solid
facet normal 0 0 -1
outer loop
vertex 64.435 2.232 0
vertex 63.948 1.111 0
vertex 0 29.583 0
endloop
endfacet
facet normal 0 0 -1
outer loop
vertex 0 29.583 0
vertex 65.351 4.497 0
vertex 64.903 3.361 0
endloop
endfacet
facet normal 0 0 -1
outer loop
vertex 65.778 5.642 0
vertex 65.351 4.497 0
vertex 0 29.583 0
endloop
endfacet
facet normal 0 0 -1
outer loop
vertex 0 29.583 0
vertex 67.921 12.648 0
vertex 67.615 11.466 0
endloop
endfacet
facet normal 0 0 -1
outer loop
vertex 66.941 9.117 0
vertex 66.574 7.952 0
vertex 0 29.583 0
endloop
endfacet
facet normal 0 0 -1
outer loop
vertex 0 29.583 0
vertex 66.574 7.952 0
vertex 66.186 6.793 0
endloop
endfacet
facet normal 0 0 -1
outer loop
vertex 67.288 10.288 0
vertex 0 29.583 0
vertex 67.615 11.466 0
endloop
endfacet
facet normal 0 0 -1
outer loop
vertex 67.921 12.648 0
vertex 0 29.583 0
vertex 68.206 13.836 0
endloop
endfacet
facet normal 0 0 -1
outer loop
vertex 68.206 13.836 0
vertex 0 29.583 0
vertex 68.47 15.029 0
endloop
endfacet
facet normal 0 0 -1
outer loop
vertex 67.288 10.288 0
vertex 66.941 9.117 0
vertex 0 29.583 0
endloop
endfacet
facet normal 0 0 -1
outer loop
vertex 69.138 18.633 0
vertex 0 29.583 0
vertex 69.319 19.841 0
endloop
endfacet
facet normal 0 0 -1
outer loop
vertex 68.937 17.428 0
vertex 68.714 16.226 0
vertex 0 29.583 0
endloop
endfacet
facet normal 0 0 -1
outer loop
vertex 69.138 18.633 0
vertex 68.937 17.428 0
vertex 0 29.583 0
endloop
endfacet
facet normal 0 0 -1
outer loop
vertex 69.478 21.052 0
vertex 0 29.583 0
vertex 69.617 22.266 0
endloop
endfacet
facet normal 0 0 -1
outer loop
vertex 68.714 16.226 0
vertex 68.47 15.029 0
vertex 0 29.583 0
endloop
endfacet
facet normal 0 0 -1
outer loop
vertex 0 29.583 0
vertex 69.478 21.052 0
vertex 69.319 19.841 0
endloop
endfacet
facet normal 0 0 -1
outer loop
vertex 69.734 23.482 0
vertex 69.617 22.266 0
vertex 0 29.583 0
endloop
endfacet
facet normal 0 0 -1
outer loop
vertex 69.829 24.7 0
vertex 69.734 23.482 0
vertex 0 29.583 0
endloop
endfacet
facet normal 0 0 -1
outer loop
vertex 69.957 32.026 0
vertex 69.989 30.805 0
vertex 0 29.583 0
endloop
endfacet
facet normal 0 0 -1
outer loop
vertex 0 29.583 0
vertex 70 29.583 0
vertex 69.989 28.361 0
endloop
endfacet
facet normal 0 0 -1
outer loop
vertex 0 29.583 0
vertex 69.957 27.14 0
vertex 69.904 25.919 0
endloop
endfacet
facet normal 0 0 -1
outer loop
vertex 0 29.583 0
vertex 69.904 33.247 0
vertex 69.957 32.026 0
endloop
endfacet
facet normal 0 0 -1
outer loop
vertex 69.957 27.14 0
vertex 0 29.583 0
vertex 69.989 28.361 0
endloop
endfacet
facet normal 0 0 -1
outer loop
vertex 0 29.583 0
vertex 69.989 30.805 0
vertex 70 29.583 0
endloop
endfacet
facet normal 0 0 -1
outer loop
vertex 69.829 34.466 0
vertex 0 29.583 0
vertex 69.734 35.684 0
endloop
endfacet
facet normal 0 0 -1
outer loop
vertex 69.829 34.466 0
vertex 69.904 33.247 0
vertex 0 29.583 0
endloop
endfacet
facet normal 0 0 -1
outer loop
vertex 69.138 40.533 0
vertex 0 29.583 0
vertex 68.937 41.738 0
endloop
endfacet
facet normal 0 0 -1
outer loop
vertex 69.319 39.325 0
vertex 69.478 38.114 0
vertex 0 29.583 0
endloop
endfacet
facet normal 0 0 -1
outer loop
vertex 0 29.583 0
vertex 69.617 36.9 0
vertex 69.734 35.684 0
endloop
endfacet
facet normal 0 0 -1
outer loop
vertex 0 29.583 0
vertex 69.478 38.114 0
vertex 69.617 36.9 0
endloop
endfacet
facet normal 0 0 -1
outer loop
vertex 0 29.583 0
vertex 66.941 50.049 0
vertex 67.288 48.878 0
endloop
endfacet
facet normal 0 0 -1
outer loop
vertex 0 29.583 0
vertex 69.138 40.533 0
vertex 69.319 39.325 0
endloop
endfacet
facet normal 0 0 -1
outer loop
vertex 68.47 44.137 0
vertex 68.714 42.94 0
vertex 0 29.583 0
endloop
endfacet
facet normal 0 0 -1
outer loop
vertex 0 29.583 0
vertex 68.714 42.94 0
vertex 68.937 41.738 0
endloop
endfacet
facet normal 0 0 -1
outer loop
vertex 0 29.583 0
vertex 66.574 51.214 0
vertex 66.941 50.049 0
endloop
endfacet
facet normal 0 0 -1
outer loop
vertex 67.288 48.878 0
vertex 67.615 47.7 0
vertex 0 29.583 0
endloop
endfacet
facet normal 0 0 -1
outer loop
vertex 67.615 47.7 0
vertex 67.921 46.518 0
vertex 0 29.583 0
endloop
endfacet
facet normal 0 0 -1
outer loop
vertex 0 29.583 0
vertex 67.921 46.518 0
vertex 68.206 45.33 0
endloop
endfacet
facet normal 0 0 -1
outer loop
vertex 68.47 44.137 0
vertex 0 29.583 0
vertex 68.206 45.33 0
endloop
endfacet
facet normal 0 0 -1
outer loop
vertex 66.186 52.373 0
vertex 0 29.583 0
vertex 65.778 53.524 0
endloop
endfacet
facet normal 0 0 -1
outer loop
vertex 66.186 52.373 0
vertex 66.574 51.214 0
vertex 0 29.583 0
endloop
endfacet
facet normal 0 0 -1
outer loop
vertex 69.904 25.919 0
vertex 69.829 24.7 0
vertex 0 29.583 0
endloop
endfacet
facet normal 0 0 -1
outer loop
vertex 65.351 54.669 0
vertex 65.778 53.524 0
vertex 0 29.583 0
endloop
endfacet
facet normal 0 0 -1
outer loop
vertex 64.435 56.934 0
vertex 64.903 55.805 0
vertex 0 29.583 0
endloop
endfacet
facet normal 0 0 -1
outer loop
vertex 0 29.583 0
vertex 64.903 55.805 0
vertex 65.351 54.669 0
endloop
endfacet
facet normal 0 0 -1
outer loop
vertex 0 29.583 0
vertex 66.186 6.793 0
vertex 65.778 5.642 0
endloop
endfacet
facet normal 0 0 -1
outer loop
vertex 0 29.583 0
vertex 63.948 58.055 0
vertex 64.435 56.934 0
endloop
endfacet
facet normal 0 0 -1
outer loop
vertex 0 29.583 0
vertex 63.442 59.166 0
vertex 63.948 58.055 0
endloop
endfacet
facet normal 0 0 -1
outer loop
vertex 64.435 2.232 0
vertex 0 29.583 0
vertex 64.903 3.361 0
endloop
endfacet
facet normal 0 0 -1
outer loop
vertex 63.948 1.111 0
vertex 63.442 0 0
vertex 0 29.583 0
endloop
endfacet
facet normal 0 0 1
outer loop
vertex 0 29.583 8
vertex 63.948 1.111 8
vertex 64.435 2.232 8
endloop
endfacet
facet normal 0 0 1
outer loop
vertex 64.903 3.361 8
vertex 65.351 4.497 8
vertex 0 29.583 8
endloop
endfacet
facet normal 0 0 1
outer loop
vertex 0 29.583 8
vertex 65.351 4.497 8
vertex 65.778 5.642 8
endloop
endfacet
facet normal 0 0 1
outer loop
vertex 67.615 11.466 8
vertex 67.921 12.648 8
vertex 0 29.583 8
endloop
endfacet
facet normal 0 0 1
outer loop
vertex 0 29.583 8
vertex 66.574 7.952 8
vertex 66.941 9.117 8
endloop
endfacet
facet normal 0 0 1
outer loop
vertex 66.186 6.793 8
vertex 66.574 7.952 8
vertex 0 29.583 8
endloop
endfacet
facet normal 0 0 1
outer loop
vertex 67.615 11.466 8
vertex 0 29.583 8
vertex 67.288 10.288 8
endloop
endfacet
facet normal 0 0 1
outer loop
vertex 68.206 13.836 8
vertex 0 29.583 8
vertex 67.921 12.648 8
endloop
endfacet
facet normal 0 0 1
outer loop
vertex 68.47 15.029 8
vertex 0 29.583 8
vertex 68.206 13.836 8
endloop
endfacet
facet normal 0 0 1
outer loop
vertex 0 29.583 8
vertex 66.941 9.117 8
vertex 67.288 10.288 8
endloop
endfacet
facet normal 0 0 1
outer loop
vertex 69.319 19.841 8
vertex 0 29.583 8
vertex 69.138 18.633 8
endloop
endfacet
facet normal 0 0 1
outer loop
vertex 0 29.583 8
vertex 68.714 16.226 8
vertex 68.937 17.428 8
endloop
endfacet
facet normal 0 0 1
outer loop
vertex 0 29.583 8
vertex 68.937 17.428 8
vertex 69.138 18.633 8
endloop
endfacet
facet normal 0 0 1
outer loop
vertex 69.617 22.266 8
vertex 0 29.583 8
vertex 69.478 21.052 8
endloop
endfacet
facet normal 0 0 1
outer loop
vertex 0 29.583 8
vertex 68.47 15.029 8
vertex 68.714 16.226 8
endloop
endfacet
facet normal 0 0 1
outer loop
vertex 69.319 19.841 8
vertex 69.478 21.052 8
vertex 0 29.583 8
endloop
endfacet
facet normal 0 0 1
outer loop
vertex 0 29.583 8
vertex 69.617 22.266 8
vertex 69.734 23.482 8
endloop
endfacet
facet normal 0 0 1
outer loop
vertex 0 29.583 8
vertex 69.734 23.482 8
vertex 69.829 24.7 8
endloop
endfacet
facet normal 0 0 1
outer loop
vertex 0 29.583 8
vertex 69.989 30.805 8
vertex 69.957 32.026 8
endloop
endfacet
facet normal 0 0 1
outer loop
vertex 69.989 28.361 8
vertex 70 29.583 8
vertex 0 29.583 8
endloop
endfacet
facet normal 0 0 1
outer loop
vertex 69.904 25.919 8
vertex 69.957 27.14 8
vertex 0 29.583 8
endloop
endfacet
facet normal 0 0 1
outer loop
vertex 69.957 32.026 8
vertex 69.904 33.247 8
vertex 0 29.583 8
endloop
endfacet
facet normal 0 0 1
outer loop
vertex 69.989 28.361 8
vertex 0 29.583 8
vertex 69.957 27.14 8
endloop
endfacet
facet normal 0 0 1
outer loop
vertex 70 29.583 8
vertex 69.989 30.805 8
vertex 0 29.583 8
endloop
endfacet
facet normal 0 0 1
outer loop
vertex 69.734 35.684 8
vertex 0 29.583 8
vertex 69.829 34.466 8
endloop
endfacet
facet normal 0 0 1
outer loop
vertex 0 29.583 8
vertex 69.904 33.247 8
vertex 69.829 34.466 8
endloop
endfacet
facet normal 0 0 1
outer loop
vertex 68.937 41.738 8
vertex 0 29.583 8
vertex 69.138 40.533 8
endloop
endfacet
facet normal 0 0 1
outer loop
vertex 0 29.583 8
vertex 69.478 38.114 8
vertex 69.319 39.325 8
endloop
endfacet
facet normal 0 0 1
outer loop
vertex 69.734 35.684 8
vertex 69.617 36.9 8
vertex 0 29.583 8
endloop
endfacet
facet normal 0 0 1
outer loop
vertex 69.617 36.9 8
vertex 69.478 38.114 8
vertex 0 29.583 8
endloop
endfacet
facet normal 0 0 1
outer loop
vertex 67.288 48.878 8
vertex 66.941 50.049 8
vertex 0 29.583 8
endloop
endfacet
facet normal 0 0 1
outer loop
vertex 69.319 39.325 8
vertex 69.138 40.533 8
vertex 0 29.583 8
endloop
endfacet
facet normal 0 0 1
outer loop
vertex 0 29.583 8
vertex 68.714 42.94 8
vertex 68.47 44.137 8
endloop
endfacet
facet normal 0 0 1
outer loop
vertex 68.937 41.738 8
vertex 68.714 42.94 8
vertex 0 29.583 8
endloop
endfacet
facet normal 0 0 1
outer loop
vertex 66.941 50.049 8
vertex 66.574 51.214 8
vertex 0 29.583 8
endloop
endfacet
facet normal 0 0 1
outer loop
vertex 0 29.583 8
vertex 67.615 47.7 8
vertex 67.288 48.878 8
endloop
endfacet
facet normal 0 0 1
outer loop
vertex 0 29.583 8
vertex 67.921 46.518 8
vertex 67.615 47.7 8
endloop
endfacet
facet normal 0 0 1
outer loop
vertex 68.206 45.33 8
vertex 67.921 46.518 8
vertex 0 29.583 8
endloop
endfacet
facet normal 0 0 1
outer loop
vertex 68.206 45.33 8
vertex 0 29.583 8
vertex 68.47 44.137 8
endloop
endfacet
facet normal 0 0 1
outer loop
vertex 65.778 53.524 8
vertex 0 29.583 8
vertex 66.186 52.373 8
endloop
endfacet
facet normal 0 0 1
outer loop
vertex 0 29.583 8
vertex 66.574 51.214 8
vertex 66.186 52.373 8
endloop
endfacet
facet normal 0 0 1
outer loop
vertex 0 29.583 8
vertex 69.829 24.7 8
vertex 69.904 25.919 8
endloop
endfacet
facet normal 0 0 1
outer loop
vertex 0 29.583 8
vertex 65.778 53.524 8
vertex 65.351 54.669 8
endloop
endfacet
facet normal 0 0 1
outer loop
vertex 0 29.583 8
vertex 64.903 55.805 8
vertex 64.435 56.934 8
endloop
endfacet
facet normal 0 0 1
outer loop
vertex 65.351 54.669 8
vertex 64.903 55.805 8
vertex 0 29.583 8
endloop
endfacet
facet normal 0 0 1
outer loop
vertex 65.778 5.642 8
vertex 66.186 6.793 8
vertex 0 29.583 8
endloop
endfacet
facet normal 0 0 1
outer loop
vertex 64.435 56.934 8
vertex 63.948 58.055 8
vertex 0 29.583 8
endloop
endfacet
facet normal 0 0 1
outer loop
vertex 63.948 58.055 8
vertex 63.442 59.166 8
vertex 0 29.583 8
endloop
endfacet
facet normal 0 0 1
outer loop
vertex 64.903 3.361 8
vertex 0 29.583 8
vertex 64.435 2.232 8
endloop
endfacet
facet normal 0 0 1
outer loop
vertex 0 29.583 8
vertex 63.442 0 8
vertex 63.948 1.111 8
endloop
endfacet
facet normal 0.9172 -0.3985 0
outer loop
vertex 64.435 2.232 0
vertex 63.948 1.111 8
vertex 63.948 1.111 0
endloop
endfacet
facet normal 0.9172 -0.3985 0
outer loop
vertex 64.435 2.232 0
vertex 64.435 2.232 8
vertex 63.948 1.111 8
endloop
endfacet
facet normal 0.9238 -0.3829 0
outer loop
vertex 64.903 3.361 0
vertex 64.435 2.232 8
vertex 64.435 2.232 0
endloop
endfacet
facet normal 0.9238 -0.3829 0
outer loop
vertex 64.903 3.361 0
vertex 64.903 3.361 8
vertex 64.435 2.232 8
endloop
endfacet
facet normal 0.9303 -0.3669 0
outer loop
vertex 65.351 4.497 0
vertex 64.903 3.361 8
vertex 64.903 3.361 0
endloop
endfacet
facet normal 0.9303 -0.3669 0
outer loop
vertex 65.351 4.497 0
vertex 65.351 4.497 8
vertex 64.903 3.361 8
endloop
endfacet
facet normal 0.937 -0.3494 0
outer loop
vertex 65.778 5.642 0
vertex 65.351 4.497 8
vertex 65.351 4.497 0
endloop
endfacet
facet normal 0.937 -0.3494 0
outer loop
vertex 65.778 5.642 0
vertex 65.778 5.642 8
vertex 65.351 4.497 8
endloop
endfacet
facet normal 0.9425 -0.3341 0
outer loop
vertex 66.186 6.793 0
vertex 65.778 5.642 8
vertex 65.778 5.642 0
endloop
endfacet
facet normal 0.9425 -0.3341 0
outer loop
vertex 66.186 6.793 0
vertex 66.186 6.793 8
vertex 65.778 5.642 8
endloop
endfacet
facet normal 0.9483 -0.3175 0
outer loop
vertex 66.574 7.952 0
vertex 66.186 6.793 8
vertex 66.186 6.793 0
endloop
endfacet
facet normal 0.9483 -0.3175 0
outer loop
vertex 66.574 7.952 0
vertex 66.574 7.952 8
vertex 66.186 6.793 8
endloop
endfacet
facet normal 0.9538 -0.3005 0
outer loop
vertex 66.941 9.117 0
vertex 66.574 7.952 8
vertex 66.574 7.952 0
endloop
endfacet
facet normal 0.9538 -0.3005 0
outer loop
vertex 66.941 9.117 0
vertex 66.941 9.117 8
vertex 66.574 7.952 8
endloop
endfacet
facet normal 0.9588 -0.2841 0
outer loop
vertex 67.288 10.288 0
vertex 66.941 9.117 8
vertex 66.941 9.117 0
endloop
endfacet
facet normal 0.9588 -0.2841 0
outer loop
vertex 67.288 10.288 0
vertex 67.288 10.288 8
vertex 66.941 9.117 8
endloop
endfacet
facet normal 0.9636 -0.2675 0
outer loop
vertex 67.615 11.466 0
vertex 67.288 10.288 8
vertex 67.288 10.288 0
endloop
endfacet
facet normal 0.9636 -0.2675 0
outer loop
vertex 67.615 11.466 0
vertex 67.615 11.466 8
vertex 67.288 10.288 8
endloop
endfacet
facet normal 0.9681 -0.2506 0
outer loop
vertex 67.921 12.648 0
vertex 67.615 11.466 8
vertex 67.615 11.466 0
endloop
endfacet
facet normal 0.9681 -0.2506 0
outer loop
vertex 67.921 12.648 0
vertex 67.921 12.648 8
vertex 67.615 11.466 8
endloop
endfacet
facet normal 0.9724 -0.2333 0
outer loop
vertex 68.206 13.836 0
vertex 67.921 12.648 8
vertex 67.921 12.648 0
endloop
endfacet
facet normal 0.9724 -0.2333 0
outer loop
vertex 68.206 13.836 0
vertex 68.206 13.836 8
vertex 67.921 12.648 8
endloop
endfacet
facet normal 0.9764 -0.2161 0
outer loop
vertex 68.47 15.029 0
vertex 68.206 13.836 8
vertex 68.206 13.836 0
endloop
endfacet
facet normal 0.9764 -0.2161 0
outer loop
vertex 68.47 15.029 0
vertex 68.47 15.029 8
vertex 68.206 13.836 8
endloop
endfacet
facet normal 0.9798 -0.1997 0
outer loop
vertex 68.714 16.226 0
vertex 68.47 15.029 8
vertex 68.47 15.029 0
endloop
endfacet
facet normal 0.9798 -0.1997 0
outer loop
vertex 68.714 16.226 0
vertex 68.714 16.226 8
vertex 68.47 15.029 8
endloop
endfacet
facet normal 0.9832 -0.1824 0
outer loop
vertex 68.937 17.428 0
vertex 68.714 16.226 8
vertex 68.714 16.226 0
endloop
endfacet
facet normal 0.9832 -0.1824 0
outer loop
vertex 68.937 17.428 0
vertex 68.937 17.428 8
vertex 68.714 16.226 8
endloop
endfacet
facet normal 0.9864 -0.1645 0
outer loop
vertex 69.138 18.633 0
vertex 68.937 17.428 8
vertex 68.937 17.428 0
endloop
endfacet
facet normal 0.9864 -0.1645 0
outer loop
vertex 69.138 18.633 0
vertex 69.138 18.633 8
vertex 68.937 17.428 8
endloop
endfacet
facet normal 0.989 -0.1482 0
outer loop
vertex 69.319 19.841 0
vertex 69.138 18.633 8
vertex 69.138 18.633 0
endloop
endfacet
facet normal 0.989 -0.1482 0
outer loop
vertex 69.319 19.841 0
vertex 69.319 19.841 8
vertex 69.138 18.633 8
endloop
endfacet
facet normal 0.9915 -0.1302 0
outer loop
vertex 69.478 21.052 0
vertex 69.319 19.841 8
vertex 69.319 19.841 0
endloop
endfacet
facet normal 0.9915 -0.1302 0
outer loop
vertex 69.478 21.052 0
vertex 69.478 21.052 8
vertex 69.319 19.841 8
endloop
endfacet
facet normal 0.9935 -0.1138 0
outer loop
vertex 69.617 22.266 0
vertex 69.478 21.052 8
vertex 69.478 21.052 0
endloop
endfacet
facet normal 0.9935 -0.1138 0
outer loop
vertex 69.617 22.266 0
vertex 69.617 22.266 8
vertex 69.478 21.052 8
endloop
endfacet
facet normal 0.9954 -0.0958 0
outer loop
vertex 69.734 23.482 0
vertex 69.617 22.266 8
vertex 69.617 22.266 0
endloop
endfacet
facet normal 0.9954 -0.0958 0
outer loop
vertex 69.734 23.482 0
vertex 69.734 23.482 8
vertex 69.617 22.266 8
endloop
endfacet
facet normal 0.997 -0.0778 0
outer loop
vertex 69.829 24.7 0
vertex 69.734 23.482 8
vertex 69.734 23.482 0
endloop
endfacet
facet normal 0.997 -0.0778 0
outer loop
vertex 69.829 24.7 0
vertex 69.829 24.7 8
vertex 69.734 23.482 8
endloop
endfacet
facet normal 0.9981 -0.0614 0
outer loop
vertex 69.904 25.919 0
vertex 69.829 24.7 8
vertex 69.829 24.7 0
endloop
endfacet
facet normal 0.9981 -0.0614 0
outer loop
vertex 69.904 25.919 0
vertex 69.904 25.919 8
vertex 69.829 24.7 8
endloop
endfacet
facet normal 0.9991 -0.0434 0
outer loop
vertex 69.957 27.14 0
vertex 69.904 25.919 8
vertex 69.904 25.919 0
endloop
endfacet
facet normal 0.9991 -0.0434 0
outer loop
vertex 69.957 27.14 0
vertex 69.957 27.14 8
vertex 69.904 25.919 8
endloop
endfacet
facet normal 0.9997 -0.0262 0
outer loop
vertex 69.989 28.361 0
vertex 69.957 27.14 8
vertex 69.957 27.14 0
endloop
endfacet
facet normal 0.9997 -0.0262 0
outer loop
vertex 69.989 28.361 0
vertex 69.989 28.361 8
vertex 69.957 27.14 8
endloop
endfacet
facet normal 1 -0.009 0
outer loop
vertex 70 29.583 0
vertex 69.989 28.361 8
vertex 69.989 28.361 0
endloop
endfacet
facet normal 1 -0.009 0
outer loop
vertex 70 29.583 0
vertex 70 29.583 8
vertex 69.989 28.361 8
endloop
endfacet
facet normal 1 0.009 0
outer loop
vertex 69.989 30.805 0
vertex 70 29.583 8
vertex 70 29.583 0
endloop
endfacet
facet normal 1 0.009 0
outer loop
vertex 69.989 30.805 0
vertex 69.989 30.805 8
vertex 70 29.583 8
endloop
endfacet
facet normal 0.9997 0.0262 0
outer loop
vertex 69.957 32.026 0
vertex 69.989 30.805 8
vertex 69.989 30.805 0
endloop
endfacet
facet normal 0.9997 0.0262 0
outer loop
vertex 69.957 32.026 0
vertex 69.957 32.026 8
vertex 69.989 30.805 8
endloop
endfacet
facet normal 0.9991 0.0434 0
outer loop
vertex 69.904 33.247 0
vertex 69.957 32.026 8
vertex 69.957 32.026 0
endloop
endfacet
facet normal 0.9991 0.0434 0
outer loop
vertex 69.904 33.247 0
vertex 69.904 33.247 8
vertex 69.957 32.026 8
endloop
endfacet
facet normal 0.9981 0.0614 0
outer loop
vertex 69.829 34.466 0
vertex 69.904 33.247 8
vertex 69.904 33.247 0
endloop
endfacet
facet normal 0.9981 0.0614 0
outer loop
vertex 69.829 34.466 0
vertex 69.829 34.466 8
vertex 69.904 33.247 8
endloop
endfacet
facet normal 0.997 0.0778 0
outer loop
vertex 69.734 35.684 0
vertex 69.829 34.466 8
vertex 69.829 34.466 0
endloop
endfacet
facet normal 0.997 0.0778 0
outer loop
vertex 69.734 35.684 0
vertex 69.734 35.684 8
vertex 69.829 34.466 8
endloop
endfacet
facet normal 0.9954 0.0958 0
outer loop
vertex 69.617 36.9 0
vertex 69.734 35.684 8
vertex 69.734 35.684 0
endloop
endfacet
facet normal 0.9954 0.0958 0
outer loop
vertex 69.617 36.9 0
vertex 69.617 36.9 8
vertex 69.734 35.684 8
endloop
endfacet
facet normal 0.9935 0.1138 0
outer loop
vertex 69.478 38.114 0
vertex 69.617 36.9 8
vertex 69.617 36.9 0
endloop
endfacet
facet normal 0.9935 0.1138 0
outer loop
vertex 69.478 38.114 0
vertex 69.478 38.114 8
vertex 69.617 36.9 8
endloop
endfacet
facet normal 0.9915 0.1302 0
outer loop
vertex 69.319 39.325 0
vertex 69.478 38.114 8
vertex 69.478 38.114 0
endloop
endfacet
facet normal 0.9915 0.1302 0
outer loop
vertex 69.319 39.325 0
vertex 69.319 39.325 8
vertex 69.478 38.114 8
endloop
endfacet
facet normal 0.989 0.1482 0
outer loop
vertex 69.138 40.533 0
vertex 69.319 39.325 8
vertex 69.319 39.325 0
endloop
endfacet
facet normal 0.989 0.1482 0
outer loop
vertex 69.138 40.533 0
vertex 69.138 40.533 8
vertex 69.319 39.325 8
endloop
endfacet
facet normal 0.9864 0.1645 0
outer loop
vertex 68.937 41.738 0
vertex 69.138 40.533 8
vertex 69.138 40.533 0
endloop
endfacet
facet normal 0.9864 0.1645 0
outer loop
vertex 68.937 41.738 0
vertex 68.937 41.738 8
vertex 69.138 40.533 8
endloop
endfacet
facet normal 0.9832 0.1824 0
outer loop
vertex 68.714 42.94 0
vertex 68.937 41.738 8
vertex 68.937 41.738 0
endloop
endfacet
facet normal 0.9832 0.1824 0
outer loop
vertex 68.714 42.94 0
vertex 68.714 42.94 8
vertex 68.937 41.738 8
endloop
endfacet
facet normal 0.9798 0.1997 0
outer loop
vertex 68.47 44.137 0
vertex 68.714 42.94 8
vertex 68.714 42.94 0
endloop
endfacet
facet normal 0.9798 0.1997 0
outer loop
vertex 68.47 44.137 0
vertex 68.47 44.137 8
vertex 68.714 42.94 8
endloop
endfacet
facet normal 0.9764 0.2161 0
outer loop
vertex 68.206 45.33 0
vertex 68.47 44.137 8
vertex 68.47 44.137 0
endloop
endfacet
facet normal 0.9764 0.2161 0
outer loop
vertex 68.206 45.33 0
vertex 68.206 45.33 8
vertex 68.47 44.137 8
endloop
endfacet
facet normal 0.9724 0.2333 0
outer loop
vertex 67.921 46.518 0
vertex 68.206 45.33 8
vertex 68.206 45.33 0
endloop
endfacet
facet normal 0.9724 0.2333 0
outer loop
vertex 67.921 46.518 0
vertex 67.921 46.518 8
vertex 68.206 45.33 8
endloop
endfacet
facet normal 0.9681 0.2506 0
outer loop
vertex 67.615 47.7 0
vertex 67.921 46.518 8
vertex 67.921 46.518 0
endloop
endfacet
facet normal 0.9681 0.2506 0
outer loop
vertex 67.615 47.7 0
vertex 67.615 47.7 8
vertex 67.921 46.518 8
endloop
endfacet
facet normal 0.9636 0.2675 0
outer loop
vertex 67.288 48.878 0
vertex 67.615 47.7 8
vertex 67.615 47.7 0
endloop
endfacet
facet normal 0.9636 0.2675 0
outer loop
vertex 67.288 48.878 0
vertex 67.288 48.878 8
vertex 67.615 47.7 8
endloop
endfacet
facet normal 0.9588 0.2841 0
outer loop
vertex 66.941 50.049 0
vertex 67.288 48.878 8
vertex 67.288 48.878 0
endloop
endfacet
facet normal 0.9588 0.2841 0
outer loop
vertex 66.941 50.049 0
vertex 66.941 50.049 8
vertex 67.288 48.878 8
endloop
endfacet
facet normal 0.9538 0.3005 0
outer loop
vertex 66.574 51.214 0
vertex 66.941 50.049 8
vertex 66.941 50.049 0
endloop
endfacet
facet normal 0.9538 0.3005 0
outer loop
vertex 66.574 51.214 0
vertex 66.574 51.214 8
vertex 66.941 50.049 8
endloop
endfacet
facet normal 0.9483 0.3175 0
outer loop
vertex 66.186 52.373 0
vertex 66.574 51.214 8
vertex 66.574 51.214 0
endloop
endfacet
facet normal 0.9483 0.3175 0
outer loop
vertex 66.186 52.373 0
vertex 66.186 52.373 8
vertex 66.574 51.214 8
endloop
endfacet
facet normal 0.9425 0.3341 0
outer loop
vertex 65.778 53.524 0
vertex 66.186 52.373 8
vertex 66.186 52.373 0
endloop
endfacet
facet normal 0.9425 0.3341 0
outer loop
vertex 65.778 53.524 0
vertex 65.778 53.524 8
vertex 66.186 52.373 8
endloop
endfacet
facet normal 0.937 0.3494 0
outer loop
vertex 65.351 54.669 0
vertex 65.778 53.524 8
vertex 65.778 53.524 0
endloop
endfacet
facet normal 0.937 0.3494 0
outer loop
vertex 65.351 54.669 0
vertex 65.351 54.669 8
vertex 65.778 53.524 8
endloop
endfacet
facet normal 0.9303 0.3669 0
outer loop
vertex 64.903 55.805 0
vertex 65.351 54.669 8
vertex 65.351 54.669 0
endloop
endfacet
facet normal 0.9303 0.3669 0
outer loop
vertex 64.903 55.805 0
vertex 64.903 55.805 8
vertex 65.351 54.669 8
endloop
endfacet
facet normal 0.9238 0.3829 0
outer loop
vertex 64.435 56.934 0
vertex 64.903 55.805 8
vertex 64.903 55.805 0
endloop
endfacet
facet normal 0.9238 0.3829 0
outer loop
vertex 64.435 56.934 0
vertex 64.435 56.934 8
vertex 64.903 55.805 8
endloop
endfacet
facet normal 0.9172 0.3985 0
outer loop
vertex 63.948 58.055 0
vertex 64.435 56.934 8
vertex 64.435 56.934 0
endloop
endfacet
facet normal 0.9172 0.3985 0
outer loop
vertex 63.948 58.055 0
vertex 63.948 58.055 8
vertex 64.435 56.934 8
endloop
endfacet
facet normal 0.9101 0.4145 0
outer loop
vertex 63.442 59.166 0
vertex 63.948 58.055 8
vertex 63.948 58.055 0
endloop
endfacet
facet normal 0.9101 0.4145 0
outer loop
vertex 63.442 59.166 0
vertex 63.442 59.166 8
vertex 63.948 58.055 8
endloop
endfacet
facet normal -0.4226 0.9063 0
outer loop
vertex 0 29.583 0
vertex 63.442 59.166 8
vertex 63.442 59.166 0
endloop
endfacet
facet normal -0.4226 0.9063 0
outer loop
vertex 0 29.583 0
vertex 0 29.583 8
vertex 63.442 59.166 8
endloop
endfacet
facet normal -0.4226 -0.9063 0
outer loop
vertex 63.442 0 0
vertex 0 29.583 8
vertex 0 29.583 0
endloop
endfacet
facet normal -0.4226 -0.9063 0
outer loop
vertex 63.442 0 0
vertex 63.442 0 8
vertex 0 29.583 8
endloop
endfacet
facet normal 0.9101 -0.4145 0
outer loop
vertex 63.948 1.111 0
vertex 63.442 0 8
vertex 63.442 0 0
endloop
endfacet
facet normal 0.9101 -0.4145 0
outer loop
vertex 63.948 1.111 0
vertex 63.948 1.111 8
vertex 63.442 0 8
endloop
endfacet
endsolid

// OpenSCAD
$fn = 32;

// ----------------------------------------------------------------------
// Arc profile plate: sector, 52 points
// ----------------------------------------------------------------------

// --- parameters (mm) ---
sector_angle = 50;        // sector angle, degrees
sector_r = 70;            // outer radius
arc_step = 1;             // sampling step of the arc, degrees
plate_t = 8;              // plate thickness, Z

bbox_x = 2 * sector_r * sin(sector_angle / 2);  // chord of the sector
bbox_y = sector_r;  // depth of the sector (apex to arc)

profile = [[63.442, 0], [63.948, 1.111], [64.435, 2.232], [64.903, 3.361], [65.351, 4.497], [65.778, 5.642], [66.186, 6.793], [66.574, 7.952], [66.941, 9.117], [67.288, 10.288], [67.615, 11.466], [67.921, 12.648], [68.206, 13.836], [68.47, 15.029], [68.714, 16.226], [68.937, 17.428], [69.138, 18.633], [69.319, 19.841], [69.478, 21.052], [69.617, 22.266], [69.734, 23.482], [69.829, 24.7], [69.904, 25.919], [69.957, 27.14], [69.989, 28.361], [70, 29.583], [69.989, 30.805], [69.957, 32.026], [69.904, 33.247], [69.829, 34.466], [69.734, 35.684], [69.617, 36.9], [69.478, 38.114], [69.319, 39.325], [69.138, 40.533], [68.937, 41.738], [68.714, 42.94], [68.47, 44.137], [68.206, 45.33], [67.921, 46.518], [67.615, 47.7], [67.288, 48.878], [66.941, 50.049], [66.574, 51.214], [66.186, 52.373], [65.778, 53.524], [65.351, 54.669], [64.903, 55.805], [64.435, 56.934], [63.948, 58.055], [63.442, 59.166], [0, 29.583]];  // primary outline, 52 points, counter clockwise

// --- the one profile operation ---
linear_extrude(height = plate_t) polygon(points = profile);
